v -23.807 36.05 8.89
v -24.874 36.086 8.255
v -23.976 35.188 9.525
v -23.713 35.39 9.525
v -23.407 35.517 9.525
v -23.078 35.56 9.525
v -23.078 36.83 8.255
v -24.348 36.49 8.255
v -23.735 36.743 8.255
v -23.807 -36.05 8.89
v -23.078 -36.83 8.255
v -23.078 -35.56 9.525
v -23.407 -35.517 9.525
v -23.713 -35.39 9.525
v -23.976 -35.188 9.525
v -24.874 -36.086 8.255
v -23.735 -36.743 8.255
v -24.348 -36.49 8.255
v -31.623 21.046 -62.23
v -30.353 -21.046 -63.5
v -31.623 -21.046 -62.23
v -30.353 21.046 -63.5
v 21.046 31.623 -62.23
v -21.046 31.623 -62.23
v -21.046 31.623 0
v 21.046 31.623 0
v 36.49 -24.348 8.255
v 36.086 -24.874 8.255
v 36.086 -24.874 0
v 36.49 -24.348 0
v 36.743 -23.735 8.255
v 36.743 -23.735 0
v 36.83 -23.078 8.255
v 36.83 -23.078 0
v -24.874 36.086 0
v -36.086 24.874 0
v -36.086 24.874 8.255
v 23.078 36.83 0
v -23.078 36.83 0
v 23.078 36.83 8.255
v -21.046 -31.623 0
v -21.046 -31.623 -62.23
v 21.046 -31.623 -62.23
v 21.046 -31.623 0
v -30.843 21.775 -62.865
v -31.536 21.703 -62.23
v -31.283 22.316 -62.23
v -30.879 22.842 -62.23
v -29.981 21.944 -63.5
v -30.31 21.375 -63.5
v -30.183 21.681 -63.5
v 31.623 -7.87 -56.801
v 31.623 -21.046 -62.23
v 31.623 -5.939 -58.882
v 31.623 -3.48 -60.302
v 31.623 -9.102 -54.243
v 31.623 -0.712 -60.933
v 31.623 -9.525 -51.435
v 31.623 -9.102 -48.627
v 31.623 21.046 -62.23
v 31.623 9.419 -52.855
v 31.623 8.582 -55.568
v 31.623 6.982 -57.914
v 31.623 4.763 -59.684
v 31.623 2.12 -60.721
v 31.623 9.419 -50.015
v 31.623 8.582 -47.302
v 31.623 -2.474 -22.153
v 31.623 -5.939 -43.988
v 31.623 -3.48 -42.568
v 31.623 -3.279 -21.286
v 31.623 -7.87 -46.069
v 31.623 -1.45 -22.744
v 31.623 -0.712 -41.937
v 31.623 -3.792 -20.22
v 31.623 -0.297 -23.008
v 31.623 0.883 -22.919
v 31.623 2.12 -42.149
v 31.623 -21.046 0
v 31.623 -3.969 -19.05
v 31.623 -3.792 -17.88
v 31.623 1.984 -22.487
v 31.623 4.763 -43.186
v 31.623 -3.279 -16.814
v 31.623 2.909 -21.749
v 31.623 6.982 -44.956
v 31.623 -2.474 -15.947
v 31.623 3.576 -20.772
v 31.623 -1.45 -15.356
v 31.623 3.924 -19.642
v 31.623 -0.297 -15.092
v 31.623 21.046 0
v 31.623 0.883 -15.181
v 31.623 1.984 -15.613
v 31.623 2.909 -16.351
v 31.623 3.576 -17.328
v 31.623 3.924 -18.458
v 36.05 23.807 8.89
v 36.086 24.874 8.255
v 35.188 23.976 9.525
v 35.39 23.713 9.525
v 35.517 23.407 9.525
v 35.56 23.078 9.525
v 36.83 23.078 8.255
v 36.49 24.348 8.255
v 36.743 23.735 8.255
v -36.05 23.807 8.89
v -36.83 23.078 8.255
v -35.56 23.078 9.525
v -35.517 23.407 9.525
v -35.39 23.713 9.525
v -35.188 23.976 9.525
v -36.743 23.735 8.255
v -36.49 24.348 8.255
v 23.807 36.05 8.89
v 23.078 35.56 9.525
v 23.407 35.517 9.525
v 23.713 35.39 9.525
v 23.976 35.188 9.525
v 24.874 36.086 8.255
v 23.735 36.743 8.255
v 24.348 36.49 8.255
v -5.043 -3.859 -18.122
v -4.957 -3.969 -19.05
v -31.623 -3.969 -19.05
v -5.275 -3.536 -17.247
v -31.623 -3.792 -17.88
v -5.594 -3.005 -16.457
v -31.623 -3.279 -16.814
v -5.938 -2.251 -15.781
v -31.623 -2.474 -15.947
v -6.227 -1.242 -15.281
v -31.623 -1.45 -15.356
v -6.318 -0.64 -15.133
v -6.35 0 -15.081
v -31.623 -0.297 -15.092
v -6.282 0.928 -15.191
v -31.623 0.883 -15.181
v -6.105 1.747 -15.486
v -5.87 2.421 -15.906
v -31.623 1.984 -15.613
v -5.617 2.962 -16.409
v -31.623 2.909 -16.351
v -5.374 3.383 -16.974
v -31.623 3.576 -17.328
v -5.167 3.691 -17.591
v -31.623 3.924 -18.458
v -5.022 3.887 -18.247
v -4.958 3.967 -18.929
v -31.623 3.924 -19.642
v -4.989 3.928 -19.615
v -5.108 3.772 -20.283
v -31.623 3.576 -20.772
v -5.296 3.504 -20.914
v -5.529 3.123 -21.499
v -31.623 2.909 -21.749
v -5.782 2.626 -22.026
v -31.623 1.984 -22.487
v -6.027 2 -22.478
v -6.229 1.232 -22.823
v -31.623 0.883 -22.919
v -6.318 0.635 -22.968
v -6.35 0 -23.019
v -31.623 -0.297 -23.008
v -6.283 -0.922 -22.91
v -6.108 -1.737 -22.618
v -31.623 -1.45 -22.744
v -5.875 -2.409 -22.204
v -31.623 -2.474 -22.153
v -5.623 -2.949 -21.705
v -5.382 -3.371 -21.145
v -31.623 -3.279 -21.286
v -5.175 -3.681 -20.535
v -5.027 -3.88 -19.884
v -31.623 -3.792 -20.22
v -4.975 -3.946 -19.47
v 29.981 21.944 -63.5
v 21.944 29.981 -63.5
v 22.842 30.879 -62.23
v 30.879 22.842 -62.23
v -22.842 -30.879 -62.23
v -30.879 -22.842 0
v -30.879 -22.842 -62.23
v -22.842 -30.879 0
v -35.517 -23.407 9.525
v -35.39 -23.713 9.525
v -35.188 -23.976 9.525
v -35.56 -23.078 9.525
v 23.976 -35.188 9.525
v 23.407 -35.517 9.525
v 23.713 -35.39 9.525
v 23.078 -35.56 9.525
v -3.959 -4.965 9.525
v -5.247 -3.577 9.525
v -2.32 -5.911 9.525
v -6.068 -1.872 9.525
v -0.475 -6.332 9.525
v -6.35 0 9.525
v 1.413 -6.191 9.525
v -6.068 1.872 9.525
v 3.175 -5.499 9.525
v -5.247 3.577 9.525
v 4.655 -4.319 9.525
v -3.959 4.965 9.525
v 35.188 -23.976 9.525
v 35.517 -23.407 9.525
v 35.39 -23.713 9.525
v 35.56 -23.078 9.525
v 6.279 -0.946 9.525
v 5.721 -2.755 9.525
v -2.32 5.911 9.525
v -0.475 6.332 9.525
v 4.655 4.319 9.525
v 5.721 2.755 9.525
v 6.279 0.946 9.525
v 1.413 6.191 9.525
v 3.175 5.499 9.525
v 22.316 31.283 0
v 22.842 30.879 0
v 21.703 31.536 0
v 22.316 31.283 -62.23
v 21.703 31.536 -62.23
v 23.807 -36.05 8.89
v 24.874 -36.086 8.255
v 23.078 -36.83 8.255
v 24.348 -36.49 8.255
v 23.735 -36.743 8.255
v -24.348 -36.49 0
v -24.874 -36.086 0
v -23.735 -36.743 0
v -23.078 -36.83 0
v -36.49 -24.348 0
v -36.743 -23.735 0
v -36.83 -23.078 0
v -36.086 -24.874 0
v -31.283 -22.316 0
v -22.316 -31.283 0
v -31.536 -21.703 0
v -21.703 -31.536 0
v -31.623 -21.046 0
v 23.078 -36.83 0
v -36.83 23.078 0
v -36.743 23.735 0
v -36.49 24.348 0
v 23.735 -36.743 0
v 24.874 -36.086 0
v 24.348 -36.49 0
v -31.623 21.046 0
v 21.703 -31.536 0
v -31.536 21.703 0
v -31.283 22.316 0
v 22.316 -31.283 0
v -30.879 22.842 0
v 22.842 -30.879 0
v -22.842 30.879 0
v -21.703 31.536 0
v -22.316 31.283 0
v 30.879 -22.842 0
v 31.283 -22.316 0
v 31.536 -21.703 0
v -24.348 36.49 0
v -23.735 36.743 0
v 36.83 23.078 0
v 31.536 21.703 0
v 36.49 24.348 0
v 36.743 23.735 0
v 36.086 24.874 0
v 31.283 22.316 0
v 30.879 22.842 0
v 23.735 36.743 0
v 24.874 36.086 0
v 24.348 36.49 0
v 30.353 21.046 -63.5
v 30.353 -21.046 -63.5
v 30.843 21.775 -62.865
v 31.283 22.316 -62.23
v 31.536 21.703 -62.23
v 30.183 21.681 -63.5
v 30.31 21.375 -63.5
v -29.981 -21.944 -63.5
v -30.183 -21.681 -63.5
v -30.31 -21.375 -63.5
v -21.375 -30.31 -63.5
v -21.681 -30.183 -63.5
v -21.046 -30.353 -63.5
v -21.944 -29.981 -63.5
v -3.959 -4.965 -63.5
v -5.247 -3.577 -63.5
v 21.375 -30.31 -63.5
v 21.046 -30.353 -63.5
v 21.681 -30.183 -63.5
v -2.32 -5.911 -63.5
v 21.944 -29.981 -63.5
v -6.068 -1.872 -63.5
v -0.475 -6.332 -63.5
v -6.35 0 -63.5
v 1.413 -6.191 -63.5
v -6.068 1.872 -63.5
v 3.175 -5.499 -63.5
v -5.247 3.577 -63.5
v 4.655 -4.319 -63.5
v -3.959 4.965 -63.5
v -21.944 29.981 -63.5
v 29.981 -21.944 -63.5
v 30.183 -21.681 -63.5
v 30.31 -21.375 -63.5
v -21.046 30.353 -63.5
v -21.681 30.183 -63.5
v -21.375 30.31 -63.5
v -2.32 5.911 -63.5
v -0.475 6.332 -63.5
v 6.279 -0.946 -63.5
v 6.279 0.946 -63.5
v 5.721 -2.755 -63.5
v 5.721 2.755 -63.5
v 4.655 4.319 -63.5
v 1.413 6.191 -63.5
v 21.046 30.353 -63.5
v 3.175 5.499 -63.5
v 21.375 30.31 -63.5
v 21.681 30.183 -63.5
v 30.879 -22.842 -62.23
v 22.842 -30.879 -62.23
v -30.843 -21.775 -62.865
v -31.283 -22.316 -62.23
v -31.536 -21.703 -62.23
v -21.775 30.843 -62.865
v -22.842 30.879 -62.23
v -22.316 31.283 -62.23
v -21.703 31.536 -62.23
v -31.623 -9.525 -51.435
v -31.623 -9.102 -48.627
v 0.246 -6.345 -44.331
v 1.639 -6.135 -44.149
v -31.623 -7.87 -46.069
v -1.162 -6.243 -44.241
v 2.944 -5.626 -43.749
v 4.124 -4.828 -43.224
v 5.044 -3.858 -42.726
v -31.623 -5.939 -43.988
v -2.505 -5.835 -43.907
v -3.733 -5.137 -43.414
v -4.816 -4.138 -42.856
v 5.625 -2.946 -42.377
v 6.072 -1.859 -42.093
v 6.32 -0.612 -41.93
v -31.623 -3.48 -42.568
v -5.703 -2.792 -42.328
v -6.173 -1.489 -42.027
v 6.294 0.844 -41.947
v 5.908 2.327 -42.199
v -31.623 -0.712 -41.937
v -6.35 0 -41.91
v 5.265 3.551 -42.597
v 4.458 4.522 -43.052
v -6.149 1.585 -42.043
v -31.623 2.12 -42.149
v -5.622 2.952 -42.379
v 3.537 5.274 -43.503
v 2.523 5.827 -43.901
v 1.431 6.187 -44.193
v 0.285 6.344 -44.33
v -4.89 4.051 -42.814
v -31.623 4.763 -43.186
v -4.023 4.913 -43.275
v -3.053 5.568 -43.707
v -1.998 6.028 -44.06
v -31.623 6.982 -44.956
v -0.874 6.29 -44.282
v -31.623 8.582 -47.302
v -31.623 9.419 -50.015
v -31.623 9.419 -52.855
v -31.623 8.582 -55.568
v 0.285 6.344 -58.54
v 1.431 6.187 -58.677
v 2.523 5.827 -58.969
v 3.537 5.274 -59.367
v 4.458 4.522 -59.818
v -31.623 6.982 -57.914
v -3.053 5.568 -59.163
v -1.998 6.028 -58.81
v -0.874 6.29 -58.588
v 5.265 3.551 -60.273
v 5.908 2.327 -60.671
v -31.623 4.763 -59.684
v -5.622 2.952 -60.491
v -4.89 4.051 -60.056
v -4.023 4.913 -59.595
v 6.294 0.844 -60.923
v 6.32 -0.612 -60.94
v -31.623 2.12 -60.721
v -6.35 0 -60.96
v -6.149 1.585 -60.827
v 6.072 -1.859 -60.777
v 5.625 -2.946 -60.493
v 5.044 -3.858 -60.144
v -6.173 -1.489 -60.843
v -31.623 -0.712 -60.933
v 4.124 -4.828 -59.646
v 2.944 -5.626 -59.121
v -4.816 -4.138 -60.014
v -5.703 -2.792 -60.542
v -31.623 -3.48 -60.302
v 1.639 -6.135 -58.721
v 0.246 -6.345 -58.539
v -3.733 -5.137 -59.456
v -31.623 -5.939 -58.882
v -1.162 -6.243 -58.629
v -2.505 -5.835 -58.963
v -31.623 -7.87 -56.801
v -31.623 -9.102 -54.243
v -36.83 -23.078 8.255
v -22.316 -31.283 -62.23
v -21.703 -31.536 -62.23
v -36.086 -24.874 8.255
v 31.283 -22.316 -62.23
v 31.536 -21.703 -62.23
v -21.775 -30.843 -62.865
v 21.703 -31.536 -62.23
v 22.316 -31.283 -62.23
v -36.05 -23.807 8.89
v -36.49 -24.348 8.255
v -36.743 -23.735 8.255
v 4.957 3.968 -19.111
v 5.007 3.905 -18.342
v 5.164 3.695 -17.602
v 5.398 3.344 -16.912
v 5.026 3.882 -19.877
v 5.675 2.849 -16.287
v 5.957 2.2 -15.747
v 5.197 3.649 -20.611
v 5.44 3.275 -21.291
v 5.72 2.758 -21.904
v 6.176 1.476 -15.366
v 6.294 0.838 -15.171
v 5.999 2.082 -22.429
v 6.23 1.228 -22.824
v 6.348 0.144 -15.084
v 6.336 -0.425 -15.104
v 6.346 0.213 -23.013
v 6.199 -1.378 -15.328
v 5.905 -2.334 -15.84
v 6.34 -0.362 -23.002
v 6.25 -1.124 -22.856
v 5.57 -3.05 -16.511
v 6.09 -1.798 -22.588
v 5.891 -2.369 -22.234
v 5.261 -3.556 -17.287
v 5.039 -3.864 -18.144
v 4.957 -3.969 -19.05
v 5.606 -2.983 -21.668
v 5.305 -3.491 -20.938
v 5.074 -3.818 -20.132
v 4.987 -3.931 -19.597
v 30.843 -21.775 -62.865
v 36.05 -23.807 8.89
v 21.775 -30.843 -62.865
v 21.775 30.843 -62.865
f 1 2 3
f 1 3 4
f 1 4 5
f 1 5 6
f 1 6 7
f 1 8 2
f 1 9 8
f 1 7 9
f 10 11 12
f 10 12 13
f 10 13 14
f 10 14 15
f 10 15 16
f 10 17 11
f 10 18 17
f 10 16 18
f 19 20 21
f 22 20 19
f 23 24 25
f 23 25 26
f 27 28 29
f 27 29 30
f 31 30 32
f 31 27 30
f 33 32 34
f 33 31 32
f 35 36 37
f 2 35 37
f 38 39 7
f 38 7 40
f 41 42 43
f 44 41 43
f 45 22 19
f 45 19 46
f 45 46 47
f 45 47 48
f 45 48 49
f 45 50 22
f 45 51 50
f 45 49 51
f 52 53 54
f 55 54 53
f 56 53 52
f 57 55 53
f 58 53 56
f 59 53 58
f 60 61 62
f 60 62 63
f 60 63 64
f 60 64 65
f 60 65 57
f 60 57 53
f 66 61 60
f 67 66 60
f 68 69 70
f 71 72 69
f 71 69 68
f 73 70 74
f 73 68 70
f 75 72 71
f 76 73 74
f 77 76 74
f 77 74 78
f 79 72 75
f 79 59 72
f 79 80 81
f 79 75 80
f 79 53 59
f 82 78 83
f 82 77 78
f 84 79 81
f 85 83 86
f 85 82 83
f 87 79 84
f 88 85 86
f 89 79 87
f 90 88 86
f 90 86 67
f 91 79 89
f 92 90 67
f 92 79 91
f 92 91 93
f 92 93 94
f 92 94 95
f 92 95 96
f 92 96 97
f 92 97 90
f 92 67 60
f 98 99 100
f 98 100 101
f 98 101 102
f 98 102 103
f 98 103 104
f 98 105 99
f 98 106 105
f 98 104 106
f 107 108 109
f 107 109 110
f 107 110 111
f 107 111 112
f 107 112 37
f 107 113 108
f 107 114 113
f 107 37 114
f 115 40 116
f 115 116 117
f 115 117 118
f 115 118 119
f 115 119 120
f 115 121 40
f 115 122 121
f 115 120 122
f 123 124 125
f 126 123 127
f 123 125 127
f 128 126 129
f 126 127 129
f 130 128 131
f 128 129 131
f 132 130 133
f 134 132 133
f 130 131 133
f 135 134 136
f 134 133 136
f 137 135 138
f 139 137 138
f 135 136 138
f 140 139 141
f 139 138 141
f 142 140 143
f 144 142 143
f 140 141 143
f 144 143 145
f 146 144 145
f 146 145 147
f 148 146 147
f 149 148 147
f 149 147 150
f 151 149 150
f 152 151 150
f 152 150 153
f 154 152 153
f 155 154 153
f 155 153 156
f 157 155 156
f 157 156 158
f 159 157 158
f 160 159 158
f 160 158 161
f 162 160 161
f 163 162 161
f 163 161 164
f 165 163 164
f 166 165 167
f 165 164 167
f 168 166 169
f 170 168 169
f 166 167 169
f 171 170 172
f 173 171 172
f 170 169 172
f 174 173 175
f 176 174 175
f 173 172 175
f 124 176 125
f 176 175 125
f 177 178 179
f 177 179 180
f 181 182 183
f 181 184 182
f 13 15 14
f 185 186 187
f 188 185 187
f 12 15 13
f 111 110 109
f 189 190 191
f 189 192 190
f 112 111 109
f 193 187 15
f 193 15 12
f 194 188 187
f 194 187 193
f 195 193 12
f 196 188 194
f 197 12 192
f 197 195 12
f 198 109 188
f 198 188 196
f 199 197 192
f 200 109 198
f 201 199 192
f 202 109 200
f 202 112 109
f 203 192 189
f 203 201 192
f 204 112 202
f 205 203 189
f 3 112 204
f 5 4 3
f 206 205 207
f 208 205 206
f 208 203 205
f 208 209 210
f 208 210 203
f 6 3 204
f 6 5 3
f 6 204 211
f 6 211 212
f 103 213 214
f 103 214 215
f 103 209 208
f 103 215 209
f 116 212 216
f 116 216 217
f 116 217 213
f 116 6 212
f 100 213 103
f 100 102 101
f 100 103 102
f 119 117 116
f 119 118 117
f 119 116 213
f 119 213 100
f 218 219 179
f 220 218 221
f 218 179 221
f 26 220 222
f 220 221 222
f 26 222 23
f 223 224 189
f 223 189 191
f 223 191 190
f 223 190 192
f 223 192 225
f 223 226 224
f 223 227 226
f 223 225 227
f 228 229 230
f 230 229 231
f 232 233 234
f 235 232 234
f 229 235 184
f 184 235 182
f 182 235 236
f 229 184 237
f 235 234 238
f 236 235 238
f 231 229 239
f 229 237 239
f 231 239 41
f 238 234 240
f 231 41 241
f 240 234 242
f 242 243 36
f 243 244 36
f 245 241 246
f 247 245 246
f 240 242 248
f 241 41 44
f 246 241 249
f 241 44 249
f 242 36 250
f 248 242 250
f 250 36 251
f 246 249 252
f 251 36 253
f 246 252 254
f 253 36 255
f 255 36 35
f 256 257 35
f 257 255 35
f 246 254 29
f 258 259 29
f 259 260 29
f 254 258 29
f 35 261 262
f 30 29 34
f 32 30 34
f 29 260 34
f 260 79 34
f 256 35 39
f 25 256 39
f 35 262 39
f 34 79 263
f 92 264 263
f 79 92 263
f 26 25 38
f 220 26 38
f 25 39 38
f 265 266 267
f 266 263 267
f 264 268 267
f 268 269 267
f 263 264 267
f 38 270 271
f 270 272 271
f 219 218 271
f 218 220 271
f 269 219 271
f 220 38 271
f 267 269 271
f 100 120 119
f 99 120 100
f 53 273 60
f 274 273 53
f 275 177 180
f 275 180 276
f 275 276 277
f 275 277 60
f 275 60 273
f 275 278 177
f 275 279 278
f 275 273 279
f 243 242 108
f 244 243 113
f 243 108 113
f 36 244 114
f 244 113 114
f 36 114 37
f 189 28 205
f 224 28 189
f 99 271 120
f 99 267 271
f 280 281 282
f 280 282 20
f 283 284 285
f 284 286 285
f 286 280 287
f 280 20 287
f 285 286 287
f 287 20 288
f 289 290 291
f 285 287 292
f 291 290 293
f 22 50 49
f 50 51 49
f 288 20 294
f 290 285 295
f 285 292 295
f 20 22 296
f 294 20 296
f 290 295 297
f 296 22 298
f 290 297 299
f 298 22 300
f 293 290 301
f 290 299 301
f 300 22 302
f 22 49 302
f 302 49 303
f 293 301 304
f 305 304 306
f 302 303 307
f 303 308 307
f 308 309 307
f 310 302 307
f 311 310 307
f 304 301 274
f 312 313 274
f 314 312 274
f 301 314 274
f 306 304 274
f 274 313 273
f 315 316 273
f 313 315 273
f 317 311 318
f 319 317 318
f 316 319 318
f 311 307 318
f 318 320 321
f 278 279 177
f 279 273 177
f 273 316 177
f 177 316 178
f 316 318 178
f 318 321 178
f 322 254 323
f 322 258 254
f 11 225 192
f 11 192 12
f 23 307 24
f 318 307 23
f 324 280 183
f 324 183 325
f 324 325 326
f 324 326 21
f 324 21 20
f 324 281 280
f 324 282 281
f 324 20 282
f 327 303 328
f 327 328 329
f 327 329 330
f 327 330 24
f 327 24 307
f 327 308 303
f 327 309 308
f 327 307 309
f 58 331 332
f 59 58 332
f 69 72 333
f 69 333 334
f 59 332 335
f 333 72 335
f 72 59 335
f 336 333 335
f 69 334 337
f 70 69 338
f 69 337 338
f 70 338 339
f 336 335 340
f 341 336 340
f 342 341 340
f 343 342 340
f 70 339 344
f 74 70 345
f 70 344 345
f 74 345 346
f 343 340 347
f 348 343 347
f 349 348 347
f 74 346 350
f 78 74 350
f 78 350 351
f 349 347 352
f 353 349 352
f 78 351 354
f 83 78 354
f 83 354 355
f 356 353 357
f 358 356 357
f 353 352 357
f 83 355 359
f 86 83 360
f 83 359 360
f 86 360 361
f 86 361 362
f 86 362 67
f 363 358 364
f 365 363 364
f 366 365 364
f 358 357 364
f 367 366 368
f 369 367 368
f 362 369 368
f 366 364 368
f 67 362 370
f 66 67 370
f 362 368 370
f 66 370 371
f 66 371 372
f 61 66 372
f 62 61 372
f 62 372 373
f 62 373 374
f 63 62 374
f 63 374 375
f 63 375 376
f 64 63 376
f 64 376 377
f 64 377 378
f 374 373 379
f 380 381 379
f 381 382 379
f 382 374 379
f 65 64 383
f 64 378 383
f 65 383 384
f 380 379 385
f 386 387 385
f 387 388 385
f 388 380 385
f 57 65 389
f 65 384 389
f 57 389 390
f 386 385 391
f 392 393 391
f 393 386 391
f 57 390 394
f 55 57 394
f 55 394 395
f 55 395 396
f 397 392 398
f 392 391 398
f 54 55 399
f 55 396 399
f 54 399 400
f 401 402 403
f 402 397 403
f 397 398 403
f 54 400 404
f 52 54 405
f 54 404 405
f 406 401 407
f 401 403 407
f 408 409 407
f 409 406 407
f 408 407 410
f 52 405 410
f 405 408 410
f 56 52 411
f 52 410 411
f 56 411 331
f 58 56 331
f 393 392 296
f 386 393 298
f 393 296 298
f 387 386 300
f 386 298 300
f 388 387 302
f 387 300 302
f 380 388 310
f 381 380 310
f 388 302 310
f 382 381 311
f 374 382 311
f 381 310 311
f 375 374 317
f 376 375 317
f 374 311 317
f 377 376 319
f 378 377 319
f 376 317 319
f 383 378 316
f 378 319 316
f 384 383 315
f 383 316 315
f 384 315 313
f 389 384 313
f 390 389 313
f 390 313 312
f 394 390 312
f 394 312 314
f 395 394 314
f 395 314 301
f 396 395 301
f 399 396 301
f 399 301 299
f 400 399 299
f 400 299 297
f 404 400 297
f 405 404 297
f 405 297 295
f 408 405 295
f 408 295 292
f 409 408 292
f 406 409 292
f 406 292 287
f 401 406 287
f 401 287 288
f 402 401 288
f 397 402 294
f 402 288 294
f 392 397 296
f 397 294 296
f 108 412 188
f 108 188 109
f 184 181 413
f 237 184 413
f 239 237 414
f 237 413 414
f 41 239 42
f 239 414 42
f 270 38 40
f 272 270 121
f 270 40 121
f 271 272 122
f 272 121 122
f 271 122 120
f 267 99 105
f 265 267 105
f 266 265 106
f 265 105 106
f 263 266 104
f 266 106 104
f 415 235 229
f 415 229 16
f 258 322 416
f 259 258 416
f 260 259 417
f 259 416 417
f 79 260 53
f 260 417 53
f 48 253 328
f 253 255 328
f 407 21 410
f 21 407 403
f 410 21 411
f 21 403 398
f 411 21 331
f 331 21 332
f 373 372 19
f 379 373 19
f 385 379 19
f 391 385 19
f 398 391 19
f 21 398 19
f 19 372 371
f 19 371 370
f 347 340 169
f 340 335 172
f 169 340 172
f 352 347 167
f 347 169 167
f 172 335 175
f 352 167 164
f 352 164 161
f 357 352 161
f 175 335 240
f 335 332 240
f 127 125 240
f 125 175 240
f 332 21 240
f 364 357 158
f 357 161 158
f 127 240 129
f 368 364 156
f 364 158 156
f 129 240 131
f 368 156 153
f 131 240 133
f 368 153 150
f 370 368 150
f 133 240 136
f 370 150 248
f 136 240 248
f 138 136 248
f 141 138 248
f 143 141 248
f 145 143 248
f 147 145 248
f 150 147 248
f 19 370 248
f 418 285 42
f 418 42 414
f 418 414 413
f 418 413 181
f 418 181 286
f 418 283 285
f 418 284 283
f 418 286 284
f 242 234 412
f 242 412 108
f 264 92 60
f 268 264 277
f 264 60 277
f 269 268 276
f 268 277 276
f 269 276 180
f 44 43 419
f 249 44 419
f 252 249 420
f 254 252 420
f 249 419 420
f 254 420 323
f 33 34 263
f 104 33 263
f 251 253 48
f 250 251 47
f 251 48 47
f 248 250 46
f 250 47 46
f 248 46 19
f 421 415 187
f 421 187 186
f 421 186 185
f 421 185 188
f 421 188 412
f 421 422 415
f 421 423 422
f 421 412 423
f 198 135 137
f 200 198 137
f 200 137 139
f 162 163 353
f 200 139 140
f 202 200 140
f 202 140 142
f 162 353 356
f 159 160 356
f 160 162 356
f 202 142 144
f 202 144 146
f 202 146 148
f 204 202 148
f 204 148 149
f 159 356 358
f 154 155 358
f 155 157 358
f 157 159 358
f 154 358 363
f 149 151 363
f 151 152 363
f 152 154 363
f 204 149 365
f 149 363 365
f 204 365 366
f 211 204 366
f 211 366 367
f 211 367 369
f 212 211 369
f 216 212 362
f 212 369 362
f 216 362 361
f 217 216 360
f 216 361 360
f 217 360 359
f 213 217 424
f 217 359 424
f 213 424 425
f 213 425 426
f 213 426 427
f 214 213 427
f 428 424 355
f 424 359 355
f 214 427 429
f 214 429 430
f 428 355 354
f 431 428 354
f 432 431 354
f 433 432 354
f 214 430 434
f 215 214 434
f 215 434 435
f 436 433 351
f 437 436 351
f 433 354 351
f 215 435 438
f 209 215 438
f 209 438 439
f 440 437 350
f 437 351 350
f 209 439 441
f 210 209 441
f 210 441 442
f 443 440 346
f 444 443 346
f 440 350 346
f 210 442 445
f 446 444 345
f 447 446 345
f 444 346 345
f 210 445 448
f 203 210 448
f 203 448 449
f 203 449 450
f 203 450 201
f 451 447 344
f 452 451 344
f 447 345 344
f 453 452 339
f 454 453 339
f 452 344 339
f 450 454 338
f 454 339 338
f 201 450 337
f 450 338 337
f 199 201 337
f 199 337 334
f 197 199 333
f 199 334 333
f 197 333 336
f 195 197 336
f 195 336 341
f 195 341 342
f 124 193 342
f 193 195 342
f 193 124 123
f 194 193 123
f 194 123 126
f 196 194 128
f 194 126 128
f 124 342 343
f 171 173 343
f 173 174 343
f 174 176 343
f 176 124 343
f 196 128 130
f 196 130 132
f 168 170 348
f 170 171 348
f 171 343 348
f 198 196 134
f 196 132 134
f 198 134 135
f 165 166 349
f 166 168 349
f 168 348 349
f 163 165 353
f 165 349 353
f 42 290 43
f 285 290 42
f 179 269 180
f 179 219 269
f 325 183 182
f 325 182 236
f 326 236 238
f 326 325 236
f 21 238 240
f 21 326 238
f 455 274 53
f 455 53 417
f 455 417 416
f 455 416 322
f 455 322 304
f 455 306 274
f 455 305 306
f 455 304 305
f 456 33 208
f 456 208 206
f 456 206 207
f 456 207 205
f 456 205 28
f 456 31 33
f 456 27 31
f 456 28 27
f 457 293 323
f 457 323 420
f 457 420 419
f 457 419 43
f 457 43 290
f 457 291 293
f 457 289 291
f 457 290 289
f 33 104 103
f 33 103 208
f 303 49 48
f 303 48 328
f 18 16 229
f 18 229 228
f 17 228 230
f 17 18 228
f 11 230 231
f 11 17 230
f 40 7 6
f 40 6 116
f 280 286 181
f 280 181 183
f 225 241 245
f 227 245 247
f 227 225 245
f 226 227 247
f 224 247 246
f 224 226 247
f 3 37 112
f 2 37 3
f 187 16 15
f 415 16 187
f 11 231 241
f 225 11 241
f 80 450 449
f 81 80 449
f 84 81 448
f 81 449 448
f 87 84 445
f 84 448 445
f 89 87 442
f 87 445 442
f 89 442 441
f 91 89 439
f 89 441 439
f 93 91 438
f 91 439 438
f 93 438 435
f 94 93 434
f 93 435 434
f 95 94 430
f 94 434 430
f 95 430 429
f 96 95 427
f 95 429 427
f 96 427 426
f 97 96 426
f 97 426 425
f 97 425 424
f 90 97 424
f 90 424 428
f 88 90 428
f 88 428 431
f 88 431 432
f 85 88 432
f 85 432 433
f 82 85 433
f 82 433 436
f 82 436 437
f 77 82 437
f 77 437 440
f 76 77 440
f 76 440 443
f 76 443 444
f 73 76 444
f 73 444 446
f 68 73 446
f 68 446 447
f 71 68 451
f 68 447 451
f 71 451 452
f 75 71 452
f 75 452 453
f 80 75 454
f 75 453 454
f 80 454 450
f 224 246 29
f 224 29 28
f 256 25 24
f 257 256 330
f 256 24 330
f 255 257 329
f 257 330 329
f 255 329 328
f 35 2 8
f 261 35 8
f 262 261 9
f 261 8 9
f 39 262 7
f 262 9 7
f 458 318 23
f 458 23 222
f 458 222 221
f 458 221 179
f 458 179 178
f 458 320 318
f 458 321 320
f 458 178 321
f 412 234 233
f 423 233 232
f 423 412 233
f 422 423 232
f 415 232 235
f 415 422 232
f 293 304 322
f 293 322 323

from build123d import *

# Parameters (mm, degrees)
F0_W     = 63.246
F0_H     = 63.246
F1_DEPTH = 63.5
F2_SIZE  = 9.525
F3_W     = 73.66
F3_H     = 73.66
F4_DEPTH = 9.525
F5_SIZE  = 12.7
F6_R     = 2.54
F7_SIZE  = 1.27
F8_R     = 9.525
F9_DEPTH = 68.454
F11_D    = 12.7
F13_D    = 7.9375


# Not quite as in the source:
# - a length typed as a fraction of an inch, garbled in the dataset ("3 / 203.2 mm" for 3/8 in), is restored


with BuildPart() as f1:
    # F0 (on Top) → F1 (new body)
    with BuildSketch(Plane.XY):
        Rectangle(F0_W, F0_H)
    extrude(amount=-F1_DEPTH)

    # F2
    f2_edges = [f1.edges().sort_by_distance(p)[0] for p in [
        (-31.623, -31.623, -31.75),
        (-31.623, 31.623, -31.75),
        (31.623, -31.623, -31.75),
        (31.623, 31.623, -31.75),
    ]]
    chamfer(f2_edges, length=F2_SIZE)

    # F3 (on face) → F4 (join)
    with BuildSketch(Plane.XY):
        Rectangle(F3_W, F3_H)
    extrude(amount=F4_DEPTH)

    # F5
    f5_edges = [f1.edges().sort_by_distance(p)[0] for p in [
        (36.83, -36.83, 4.7625),
        (-36.83, -36.83, 4.7625),
        (36.83, 36.83, 4.7625),
        (-36.83, 36.83, 4.7625),
    ]]
    chamfer(f5_edges, length=F5_SIZE)

    # F6
    f6_edges = [f1.edges().sort_by_distance(p)[0] for p in [
        (-24.13, -36.83, 4.7625),
        (24.13, -36.83, 4.7625),
        (36.83, -24.13, 4.7625),
        (-36.83, -24.13, 4.7625),
        (36.83, 24.13, 4.7625),
        (24.13, 36.83, 4.7625),
        (-24.13, 36.83, 4.7625),
        (-36.83, 24.13, 4.7625),
        (-22.098, 31.623, -31.75),
        (-31.623, 22.098, -31.75),
        (22.098, 31.623, -31.75),
        (31.623, 22.098, -31.75),
        (-31.623, -22.098, -31.75),
        (-22.098, -31.623, -31.75),
        (31.623, -22.098, -31.75),
        (22.098, -31.623, -31.75),
    ]]
    fillet(f6_edges, radius=F6_R)

    # F7
    f7_edges = [f1.edges().sort_by_distance(p)[0] for p in [
        (-30.48, 30.48, 9.525),
        (-31.623, 0, -63.5),
    ]]
    chamfer(f7_edges, length=F7_SIZE)

    # F8 (on face) → F9 (cut, through all)
    with BuildSketch(Plane(origin=(-31.623, 0, 0), x_dir=(0, -1, 0), z_dir=(-1, 0, 0))):
        with Locations((0, -51.435)):
            Circle(F8_R)
    extrude(amount=-F9_DEPTH, mode=Mode.SUBTRACT)

    # F11 (through all)
    with Locations(Plane.XY.offset(9.525)):
        with Locations((0, 0)):
            Hole(F11_D / 2)

    # F13 (through all)
    with Locations(Plane.YZ.offset(31.623)):
        with Locations((0, -19.05)):
            Hole(F13_D / 2)


solid = f1.part
